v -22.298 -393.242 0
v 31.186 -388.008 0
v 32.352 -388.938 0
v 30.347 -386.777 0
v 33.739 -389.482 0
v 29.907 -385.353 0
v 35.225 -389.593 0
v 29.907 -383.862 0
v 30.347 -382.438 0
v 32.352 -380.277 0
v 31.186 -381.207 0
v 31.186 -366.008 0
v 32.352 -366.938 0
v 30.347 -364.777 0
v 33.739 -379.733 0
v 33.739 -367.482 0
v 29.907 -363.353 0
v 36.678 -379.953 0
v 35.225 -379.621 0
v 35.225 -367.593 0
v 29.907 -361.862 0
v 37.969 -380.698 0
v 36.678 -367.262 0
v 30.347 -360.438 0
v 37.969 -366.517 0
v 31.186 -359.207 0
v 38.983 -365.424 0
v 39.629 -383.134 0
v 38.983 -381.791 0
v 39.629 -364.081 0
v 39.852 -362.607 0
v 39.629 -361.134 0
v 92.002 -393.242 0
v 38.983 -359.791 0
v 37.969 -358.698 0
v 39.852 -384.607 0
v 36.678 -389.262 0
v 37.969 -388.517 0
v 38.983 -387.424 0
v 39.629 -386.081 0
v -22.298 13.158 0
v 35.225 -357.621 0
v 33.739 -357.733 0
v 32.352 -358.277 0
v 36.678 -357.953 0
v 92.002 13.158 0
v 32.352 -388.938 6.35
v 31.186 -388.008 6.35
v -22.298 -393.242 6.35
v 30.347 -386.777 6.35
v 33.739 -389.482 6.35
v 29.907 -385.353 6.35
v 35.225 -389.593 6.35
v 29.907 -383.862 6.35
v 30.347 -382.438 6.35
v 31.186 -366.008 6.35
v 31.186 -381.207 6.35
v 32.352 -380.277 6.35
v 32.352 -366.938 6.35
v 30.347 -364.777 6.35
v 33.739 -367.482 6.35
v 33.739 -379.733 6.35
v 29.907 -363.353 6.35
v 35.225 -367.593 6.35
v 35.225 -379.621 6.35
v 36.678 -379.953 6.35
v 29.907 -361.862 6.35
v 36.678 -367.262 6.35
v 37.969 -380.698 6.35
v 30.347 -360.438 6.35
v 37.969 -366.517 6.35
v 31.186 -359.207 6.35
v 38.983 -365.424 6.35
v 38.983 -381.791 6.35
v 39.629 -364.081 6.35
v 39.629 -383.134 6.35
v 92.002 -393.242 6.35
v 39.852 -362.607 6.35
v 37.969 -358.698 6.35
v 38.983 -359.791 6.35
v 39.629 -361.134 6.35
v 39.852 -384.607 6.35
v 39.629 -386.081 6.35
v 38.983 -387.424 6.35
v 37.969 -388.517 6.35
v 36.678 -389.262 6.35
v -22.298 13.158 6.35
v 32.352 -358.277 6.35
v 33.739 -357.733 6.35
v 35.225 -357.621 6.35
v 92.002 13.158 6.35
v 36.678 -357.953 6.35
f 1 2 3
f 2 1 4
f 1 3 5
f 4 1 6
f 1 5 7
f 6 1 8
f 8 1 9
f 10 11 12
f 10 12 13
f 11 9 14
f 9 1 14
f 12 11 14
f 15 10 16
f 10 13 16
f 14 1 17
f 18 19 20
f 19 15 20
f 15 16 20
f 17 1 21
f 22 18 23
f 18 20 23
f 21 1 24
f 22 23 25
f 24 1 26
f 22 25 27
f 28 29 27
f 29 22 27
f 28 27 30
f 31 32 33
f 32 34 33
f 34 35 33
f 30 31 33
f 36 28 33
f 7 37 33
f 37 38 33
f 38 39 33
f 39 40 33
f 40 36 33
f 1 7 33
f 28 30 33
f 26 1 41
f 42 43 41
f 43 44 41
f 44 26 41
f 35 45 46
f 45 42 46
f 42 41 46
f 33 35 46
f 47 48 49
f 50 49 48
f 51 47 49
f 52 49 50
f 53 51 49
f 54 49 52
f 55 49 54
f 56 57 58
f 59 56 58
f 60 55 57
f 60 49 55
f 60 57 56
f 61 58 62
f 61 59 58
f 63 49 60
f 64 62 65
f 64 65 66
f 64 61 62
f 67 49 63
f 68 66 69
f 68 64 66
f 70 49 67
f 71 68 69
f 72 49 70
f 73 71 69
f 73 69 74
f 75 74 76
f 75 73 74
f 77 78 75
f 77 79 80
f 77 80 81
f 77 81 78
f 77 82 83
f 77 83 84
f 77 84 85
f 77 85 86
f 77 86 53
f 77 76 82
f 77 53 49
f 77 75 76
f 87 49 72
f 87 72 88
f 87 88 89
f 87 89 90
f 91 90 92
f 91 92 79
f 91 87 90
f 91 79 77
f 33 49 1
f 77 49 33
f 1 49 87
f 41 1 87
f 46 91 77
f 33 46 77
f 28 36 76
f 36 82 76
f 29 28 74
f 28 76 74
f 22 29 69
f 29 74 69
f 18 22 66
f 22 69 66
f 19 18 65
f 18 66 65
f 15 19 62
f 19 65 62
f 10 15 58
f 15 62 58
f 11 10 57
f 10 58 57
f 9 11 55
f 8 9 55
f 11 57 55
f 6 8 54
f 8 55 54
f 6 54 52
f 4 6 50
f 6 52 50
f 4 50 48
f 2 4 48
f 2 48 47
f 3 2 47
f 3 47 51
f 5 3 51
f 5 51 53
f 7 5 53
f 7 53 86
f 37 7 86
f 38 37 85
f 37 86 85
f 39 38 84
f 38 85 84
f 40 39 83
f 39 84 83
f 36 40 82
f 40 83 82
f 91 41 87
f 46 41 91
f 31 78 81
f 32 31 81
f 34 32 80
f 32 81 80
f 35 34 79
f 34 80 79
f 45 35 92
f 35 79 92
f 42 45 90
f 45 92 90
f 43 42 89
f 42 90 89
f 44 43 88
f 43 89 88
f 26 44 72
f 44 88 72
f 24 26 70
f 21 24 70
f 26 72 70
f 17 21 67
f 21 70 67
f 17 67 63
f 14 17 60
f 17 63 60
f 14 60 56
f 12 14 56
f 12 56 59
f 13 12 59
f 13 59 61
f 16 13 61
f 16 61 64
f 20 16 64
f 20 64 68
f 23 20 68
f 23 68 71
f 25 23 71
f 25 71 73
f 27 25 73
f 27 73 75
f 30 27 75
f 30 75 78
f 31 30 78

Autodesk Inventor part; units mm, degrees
ref_plane "YZ Plane" through (0, 0, 0) normal (1, 0, 0) x (0, 1, 0)
ref_plane "XZ Plane" through (0, 0, 0) normal (0, 1, 0) x (-1, 0, 0)
ref_plane "XY Plane" through (0, 0, 0) normal (0, 0, 1) x (1, 0, 0)
sketch "Sketch1" plane through (0, 0, 0) normal (0, 0, 1) x (1, 0, 0)
  line L0 (-22.2985, 25.8576) -> (117.4015, 25.8576)
  line L1 (117.4015, 25.8576) -> (117.4015, -278.9424)
  line L2 (117.4015, -278.9424) -> (-22.2985, -278.9424)
  line L3 (-22.2985, -278.9424) -> (-22.2985, 25.8576)
  point P0 (0, 0)
  dimension "d0" = 139.7
  dimension "d1" = 304.8
extrude "Extrusion1" add sketch "Sketch1" along normal blind 6.35
sketch "Sketch2" plane through (117.4015, -278.9424, 0) normal (1, 0, 0) x (0, 0, -1)
  line L0 (-6.35, 304.8) -> (-6.35, 0) projected
  line L1 (0, 0) -> (-6.35, 0) projected
  line L2 (0, 304.8) -> (0, 0) projected
  line L3 (0, 304.8) -> (-6.35, 304.8) projected
  point P0 (0, 278.9424)
extrude "Extrusion2" add sketch "Sketch2" along normal blind 12.7
sketch "Sketch3" plane through (130.1015, -278.9424, 0) normal (1, 0, 0) x (0, 0, -1)
  line L0 (-6.35, 304.8) -> (0, 304.8) projected
  line L1 (-6.35, 0) -> (-6.35, 304.8) projected
  line L2 (0, 0) -> (-6.35, 0) projected
  line L3 (0, 304.8) -> (0, 0) projected
  point P0 (0, 278.9424)
extrude "Extrusion3" cut sketch "Sketch3" against normal blind 38.1
sketch "Sketch5" plane through (0, 0, 6.35) normal (0, 0, 1) x (1, 0, 0)
  line L0 (-22.2985, -278.9424) -> (92.0015, -278.9424)
  line L1 (92.0015, -278.9424) -> (92.0015, -532.9424)
  line L2 (92.0015, -532.9424) -> (-22.2985, -532.9424)
  line L3 (-22.2985, -532.9424) -> (-22.2985, -278.9424)
  point P0 (0, 0)
  dimension "d9" = 254
extrude "Extrusion4" add sketch "Sketch5" against normal blind 6.35
sketch "Sketch6" plane through (-22.2985, -532.9424, 6.35) normal (0, -1, 0) x (1, 0, 0)
  line L0 (0, -6.35) -> (114.3, -6.35) projected
  line L1 (114.3, 0) -> (114.3, -6.35) projected
  line L2 (0, 0) -> (114.3, 0) projected
  line L3 (0, 0) -> (0, -6.35) projected
  point P0 (22.2985, -6.35)
extrude "Extrusion5" cut sketch "Sketch6" against normal blind 127
sketch "Sketch7" plane through (0, 0, 6.35) normal (0, 0, 1) x (1, 0, 0)
  line L0 (-22.2985, -405.9424) -> (92.0015, -405.9424) projected
  line L1 (92.0015, -405.9424) -> (92.0015, 25.8576) projected
  line L2 (-22.2985, -405.9424) -> (92.0015, -405.9424)
  line L3 (92.0015, -405.9424) -> (92.0015, -399.5924)
  line L4 (92.0015, -399.5924) -> (-22.2985, -399.5924)
  line L5 (-22.2985, -399.5924) -> (-22.2985, -405.9424)
  point P0 (0, 0)
  dimension "d14" = 6.35
extrude "Extrusion6" cut sketch "Sketch7" against normal blind 25.4
sketch "Sketch8" plane through (0, 0, 6.35) normal (0, 0, 1) x (1, 0, 0)
  line L0 (-22.2985, -399.5924) -> (92.0015, -399.5924)
  line L1 (92.0015, -399.5924) -> (92.0015, -405.9424)
  line L2 (92.0015, -405.9424) -> (-22.2985, -405.9424)
  line L3 (-22.2985, -405.9424) -> (-22.2985, -399.5924)
  point P0 (0, 0)
  dimension "d17" = 6.35
extrude "Extrusion7" add sketch "Sketch8" against normal blind 6.35
sketch "Sketch9" plane through (0, 0, 6.35) normal (0, 0, 1) x (1, 0, 0)
  line L0 (-22.2985, -405.9424) -> (92.0015, -405.9424) projected
  line L1 (34.8515, -405.9424) -> (34.8515, -392.6074)
  line L2 (34.8515, -392.6074) -> (34.8515, -384.6074)
  circle A0 centre (34.8515, -384.6074) radius 5
  line L3 (34.8515, -392.6074) -> (34.8515, -362.6074)
  circle A1 centre (34.8515, -362.6074) radius 5
  point P0 (0, 0)
  dimension "d20" = 13.335
  dimension "d21" = 8
  dimension "d22" = 10
  dimension "d23" = 30
  dimension "d24" = 10
extrude "Extrusion8" cut sketch "Sketch9" against normal blind 25.4
sketch "Sketch10" plane through (-22.2985, 25.8576, 6.35) normal (0, 1, 0) x (1, 0, 0)
  line L0 (114.3, 0) -> (114.3, 6.35) projected
  line L1 (0, 6.35) -> (114.3, 6.35) projected
  line L2 (0, 6.35) -> (0, 0) projected
  line L3 (0, 0) -> (114.3, 0) projected
  point P0 (22.2985, 6.35)
extrude "Extrusion9" cut sketch "Sketch10" against normal blind 12.7
sketch "Sketch11" plane through (-22.2985, -405.9424, 6.35) normal (0, -1, 0) x (1, 0, 0)
  line L0 (0, -6.35) -> (114.3, -6.35) projected
  line L1 (114.3, 0) -> (114.3, -6.35) projected
  line L2 (0, 0) -> (114.3, 0) projected
  line L3 (0, 0) -> (0, -6.35) projected
  point P0 (22.2985, -6.35)
extrude "Extrusion10" cut sketch "Sketch11" against normal blind 12.7
properties part number "back"
